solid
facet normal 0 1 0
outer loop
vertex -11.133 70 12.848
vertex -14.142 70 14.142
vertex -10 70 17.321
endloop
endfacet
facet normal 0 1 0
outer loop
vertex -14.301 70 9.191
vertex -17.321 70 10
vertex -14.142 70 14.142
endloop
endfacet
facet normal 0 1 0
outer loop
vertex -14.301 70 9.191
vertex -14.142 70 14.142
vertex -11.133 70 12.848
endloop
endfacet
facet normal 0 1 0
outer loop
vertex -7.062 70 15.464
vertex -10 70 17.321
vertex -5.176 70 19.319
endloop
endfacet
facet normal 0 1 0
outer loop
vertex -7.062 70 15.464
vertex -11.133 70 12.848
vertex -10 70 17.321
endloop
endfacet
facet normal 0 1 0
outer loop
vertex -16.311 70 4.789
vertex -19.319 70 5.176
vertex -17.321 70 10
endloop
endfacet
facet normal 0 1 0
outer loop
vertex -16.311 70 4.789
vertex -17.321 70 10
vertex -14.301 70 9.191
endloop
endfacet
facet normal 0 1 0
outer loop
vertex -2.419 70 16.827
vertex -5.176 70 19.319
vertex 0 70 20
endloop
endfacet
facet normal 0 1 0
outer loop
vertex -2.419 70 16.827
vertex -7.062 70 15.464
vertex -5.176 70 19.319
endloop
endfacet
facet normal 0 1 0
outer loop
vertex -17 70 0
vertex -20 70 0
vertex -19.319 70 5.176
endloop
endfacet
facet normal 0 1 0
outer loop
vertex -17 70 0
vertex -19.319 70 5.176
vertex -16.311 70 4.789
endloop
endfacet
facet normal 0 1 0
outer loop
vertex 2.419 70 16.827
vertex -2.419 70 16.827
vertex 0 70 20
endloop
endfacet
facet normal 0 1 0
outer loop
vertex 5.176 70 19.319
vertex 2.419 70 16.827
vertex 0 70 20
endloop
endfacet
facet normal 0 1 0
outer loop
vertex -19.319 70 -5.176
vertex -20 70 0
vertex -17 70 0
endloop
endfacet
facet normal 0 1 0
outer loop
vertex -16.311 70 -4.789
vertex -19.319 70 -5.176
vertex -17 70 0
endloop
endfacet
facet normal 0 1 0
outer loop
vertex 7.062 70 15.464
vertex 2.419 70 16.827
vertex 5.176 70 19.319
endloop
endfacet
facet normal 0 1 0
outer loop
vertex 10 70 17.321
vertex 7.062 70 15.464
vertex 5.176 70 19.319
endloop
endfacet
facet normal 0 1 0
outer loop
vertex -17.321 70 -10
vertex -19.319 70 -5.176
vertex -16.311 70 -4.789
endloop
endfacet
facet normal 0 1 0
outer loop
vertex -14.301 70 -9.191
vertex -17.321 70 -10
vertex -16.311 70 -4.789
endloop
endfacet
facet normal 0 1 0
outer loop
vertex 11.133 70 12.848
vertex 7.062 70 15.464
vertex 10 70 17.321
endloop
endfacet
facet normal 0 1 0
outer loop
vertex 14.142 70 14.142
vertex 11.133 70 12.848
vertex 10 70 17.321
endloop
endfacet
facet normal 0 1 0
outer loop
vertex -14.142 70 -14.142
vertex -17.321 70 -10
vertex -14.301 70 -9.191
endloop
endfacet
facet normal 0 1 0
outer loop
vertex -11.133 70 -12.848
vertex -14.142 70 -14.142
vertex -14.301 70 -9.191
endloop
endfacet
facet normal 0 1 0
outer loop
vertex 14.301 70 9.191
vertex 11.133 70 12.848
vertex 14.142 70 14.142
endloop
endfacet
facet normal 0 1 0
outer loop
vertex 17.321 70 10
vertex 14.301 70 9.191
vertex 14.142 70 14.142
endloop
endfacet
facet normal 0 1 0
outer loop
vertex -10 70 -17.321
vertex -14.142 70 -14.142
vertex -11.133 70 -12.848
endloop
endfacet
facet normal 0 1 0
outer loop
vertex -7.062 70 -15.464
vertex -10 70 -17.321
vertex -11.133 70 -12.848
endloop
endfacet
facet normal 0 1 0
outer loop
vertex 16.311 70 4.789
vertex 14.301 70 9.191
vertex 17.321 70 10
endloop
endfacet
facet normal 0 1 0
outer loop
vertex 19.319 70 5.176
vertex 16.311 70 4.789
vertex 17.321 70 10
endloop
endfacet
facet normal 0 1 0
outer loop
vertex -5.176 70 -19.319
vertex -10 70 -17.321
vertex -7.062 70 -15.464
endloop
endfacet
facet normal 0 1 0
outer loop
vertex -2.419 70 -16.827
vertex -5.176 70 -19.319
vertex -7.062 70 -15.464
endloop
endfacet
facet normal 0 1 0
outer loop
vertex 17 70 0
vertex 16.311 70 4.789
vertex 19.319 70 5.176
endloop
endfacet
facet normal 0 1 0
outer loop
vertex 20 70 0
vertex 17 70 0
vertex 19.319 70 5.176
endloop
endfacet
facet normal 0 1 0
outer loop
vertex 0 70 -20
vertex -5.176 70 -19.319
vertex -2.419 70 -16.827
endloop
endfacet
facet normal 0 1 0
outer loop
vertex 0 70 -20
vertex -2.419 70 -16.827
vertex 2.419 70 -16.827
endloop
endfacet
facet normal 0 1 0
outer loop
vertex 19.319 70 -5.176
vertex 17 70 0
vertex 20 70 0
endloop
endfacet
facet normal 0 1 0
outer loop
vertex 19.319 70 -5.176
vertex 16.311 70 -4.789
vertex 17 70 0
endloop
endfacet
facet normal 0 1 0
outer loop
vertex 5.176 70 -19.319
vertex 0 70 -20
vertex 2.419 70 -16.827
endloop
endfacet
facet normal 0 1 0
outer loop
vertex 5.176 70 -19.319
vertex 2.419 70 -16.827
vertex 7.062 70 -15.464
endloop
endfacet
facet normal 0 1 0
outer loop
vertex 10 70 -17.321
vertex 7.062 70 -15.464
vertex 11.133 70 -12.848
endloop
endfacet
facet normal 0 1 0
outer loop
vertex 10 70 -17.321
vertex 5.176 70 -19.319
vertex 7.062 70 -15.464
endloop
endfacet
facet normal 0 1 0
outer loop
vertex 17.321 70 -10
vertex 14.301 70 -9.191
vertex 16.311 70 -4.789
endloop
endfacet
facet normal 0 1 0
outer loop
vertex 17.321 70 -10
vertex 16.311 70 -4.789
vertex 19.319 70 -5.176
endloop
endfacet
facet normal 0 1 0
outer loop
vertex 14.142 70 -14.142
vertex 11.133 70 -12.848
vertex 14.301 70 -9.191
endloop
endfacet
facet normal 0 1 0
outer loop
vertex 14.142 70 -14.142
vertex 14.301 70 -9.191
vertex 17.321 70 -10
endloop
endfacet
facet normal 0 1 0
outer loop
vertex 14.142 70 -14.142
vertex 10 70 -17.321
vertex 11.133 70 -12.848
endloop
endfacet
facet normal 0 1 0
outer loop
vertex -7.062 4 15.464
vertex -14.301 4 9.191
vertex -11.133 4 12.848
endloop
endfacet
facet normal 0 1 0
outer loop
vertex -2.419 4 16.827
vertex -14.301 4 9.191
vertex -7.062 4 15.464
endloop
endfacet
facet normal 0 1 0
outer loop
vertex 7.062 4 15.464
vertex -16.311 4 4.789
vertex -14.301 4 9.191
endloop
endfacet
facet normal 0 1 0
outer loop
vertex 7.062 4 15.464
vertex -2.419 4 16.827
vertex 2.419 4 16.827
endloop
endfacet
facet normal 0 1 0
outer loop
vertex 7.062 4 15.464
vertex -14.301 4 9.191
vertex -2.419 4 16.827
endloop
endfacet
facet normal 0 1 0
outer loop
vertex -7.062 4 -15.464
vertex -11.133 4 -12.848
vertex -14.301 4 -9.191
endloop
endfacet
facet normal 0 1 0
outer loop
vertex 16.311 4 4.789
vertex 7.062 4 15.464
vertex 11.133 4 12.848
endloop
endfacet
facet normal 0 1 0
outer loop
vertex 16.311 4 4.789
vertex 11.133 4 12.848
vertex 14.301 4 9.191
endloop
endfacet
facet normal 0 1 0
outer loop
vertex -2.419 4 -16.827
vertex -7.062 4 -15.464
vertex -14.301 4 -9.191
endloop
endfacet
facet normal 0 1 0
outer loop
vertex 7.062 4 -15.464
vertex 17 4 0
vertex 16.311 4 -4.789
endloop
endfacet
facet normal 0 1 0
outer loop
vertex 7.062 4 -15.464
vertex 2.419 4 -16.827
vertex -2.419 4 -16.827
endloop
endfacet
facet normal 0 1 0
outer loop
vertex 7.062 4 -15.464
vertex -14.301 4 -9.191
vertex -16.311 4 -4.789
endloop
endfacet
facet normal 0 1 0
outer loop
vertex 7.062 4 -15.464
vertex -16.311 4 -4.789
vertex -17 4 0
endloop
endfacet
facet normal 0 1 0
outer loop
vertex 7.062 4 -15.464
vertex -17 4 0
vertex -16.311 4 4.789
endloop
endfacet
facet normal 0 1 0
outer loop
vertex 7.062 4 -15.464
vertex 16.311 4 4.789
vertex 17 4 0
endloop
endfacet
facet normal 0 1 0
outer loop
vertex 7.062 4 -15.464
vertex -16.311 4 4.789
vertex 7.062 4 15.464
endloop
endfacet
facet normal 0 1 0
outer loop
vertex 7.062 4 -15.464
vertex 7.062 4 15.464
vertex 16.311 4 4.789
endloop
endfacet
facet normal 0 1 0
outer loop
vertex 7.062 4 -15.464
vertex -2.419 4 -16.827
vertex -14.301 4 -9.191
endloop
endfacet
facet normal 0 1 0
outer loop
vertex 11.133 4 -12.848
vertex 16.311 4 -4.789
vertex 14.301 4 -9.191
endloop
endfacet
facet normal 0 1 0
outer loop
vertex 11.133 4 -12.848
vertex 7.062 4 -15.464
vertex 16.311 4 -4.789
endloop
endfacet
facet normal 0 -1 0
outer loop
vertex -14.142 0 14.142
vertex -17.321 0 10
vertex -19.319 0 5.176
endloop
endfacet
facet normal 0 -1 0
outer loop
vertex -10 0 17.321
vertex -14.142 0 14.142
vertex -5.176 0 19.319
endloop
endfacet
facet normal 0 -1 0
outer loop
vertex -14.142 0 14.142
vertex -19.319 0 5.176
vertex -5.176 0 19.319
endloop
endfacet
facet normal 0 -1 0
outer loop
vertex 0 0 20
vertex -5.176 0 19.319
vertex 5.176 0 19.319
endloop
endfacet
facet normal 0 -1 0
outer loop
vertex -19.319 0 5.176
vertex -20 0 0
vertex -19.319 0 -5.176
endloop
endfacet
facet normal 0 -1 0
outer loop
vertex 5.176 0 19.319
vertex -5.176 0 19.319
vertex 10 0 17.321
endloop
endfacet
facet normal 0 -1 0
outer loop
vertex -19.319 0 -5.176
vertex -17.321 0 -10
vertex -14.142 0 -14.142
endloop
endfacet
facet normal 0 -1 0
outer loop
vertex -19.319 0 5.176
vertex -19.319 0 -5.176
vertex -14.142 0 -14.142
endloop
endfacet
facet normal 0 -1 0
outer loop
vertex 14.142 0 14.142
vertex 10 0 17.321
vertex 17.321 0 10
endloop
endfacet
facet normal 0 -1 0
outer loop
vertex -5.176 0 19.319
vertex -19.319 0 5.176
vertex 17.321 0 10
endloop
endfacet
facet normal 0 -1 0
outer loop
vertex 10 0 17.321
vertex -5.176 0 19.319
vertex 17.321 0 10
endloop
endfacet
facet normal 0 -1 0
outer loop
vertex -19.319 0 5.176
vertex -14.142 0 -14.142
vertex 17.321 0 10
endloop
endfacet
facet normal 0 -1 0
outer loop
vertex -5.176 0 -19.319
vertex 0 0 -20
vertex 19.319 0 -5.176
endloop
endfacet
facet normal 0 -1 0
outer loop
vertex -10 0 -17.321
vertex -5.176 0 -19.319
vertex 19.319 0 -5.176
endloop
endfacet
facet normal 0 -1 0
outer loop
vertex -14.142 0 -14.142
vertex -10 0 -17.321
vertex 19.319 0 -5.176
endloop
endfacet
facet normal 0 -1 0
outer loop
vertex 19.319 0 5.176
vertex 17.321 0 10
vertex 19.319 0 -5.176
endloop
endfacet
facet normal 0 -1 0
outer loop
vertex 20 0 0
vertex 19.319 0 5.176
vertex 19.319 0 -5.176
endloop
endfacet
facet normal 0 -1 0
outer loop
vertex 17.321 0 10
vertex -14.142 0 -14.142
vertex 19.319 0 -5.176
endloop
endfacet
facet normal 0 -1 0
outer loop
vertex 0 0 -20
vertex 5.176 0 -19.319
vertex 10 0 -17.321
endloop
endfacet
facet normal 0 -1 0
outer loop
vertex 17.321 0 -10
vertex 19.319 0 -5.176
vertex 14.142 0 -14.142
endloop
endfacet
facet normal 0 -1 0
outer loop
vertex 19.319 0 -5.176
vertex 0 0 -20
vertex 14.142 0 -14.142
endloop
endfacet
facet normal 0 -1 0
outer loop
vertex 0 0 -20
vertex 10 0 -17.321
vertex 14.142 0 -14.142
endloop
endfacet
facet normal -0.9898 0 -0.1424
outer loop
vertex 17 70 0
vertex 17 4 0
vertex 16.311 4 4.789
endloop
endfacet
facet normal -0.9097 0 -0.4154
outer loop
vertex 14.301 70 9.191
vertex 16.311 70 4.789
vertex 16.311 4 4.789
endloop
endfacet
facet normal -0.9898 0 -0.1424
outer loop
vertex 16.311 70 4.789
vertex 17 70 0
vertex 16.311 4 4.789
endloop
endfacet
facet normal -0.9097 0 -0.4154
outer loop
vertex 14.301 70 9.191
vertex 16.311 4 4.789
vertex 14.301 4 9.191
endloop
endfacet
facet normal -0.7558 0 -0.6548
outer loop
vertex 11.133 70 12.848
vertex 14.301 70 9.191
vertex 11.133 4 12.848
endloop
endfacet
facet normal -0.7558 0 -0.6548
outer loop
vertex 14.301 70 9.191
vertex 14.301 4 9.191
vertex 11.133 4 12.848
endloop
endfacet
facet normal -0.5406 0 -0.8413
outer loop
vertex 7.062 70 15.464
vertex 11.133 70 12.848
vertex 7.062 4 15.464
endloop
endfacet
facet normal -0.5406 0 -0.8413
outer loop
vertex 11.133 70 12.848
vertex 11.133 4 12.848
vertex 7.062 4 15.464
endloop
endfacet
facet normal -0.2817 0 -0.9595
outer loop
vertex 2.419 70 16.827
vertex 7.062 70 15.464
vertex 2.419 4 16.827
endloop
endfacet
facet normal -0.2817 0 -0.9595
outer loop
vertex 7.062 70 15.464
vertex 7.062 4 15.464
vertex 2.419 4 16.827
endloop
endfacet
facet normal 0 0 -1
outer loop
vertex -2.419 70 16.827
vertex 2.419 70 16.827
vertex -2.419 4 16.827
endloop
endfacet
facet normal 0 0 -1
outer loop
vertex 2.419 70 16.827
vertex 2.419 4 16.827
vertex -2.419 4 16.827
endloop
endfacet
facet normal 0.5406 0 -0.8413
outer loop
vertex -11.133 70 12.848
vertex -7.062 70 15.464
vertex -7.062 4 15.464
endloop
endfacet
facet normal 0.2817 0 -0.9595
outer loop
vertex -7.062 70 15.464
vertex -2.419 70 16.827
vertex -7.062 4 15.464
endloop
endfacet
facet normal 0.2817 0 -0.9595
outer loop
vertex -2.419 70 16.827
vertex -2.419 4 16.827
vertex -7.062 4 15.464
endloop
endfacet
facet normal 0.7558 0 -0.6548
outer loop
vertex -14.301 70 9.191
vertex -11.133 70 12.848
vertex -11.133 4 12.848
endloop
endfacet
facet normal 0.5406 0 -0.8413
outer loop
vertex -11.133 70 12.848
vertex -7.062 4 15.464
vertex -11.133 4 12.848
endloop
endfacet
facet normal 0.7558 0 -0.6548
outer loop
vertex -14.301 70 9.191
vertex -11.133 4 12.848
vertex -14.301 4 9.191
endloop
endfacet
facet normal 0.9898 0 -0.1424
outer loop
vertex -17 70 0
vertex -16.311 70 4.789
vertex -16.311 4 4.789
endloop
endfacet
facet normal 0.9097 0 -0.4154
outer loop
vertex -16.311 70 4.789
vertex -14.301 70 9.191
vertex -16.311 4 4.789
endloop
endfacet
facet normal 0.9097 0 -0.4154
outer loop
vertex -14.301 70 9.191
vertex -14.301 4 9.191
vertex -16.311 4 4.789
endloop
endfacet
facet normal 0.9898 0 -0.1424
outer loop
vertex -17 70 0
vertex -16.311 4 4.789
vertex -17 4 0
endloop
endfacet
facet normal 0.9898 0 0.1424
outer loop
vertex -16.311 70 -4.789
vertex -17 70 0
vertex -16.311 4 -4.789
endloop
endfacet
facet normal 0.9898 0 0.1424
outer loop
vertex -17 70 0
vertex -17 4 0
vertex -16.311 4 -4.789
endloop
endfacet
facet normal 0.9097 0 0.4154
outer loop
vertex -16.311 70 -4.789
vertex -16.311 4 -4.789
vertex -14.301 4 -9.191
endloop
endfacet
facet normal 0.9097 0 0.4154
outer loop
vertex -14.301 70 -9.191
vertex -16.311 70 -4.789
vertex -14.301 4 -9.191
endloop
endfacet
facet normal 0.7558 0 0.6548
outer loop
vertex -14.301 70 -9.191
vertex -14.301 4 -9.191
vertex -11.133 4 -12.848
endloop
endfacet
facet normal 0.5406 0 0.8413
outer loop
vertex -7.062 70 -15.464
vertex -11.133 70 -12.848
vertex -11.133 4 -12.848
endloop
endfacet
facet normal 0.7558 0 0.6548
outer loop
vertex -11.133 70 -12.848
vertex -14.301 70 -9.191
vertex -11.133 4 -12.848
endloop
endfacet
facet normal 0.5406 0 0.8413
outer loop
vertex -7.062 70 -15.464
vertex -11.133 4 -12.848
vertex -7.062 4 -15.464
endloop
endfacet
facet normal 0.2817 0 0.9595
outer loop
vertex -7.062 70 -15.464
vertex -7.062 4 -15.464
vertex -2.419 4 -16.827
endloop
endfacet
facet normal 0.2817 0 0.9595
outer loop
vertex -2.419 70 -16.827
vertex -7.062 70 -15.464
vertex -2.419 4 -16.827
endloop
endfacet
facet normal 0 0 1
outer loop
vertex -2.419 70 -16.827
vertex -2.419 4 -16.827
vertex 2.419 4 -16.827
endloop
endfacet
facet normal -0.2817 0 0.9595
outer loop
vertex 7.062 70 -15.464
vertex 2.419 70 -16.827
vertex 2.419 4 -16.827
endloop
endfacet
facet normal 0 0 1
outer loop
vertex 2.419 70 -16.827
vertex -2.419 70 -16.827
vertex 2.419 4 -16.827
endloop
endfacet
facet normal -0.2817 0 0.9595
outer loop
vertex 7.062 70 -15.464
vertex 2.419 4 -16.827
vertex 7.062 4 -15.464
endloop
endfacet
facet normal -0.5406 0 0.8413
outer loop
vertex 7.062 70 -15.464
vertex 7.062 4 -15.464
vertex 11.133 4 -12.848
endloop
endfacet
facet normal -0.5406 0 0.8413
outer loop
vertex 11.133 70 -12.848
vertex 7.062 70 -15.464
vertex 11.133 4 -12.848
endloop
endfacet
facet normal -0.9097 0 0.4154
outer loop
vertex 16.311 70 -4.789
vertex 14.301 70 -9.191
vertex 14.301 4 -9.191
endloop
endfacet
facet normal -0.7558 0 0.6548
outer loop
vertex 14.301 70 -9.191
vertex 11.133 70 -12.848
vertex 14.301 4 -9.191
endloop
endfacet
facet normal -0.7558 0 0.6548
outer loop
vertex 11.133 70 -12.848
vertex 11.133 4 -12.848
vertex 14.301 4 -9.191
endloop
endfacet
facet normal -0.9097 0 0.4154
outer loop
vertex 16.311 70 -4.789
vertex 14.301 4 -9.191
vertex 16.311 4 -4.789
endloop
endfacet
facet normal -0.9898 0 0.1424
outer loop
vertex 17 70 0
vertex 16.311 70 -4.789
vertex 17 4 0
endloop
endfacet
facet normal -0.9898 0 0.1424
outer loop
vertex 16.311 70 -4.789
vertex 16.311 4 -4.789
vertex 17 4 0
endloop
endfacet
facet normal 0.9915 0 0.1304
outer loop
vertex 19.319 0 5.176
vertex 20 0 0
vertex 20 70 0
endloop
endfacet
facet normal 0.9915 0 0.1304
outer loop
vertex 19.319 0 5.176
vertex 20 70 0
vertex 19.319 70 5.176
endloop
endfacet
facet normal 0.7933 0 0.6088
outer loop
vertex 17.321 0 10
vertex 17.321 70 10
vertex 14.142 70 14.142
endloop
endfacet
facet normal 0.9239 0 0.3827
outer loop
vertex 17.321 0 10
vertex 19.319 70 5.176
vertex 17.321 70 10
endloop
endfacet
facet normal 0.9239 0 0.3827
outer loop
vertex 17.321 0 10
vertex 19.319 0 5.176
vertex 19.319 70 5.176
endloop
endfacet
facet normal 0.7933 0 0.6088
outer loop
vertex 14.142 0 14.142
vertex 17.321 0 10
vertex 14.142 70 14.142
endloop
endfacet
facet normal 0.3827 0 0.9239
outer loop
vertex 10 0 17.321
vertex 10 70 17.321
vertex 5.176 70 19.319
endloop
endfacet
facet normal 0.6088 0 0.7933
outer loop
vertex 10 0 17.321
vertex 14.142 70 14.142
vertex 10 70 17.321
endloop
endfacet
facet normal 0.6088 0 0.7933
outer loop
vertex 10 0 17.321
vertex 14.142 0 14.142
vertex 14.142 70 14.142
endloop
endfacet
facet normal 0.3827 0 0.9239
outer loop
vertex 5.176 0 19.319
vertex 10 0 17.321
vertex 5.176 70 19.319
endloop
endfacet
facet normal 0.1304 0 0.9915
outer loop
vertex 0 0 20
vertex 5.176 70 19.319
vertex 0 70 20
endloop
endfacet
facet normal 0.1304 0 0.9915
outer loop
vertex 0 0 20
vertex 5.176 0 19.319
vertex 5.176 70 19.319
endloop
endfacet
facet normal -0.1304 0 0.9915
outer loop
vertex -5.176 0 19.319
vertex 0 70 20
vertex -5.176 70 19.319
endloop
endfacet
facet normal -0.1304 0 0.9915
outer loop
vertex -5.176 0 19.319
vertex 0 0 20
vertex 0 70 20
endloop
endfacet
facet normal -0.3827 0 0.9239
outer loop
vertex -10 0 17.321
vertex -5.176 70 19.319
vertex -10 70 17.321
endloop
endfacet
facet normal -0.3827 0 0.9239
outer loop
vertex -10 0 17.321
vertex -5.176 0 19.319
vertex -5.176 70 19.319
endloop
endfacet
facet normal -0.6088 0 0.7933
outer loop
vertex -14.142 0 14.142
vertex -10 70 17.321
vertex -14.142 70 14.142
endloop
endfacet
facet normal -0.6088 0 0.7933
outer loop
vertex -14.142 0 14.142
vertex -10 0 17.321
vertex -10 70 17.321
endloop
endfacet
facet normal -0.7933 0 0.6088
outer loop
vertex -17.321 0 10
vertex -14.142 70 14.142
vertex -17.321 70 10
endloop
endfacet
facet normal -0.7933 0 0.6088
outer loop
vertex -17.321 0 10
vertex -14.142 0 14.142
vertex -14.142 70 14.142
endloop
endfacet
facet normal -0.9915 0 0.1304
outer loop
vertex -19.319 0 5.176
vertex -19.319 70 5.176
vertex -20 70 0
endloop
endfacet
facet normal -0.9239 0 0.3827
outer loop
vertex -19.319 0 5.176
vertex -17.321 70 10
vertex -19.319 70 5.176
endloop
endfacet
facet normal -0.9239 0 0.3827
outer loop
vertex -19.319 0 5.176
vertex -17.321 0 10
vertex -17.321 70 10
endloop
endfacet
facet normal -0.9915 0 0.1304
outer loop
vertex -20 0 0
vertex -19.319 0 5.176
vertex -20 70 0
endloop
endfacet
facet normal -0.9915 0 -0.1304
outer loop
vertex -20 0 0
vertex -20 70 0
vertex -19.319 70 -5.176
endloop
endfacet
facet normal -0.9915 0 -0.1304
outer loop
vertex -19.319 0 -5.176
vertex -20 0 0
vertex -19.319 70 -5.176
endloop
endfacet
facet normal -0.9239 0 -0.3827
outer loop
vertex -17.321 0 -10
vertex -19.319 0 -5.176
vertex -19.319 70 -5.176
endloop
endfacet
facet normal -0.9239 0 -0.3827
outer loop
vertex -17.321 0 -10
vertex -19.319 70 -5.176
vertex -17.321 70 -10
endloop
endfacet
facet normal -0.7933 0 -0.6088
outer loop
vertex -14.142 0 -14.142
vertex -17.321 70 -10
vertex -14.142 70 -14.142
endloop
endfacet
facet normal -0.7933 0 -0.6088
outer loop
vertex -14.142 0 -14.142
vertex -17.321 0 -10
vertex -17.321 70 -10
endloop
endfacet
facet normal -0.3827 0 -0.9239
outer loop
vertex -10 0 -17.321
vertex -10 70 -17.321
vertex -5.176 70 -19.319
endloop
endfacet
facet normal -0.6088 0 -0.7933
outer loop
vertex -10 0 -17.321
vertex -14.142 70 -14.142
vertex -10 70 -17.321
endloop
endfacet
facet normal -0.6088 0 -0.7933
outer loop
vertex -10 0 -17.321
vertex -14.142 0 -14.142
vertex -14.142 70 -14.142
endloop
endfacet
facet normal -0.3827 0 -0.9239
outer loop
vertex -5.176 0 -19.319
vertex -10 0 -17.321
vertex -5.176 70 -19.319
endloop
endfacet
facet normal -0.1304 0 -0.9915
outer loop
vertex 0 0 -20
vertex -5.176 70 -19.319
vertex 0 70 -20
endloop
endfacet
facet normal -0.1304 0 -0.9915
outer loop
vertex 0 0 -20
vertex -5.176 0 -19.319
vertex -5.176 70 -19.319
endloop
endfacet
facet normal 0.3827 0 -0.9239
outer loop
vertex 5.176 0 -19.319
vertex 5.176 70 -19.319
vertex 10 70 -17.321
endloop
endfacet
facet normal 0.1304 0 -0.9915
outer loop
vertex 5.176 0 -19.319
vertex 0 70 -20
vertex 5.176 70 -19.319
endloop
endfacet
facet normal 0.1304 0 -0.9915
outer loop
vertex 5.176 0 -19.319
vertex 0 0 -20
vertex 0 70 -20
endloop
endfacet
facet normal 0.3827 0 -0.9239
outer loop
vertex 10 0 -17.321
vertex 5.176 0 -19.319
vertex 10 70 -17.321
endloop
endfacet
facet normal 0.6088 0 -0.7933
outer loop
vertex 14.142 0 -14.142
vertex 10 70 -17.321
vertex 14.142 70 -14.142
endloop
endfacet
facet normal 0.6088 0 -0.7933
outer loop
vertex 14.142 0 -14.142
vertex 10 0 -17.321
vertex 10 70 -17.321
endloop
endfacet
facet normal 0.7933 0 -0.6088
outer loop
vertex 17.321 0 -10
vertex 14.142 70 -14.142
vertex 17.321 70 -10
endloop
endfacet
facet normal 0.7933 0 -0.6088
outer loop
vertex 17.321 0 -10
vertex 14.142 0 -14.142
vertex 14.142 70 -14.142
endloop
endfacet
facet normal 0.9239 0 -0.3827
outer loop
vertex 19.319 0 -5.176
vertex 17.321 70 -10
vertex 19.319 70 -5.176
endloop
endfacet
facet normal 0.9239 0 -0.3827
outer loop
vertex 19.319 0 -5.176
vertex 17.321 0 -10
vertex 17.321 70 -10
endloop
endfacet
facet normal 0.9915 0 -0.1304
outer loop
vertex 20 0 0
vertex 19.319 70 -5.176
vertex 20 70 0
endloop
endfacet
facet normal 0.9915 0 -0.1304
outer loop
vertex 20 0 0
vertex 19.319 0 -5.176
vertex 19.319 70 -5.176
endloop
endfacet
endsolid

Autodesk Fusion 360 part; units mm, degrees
sketch "Sketch1" plane through (0, 0, 0) normal (0, 1, 0) x (1, 0, 0)
  circle A0 centre (0, 0) radius 20
  circle A1 centre (0, 0) radius 17
  dimension "d1" = 40
  dimension "d7" = 3
extrude "Extrude1" add sketch "Sketch1" along normal blind 70 makes body 1
extrude "Extrude2" add sketch "Sketch1" along normal blind 4 contours A1 bodies 1
copy_body "Body->Comp1" bodies 1 removing the originals makes body 2 in component "tubeToolHolder02"
component "tubeToolHolder02" placed x (1, 0, 0) y (0, 1, 0) z (0, 0, 1) at (0, 0, 0)
